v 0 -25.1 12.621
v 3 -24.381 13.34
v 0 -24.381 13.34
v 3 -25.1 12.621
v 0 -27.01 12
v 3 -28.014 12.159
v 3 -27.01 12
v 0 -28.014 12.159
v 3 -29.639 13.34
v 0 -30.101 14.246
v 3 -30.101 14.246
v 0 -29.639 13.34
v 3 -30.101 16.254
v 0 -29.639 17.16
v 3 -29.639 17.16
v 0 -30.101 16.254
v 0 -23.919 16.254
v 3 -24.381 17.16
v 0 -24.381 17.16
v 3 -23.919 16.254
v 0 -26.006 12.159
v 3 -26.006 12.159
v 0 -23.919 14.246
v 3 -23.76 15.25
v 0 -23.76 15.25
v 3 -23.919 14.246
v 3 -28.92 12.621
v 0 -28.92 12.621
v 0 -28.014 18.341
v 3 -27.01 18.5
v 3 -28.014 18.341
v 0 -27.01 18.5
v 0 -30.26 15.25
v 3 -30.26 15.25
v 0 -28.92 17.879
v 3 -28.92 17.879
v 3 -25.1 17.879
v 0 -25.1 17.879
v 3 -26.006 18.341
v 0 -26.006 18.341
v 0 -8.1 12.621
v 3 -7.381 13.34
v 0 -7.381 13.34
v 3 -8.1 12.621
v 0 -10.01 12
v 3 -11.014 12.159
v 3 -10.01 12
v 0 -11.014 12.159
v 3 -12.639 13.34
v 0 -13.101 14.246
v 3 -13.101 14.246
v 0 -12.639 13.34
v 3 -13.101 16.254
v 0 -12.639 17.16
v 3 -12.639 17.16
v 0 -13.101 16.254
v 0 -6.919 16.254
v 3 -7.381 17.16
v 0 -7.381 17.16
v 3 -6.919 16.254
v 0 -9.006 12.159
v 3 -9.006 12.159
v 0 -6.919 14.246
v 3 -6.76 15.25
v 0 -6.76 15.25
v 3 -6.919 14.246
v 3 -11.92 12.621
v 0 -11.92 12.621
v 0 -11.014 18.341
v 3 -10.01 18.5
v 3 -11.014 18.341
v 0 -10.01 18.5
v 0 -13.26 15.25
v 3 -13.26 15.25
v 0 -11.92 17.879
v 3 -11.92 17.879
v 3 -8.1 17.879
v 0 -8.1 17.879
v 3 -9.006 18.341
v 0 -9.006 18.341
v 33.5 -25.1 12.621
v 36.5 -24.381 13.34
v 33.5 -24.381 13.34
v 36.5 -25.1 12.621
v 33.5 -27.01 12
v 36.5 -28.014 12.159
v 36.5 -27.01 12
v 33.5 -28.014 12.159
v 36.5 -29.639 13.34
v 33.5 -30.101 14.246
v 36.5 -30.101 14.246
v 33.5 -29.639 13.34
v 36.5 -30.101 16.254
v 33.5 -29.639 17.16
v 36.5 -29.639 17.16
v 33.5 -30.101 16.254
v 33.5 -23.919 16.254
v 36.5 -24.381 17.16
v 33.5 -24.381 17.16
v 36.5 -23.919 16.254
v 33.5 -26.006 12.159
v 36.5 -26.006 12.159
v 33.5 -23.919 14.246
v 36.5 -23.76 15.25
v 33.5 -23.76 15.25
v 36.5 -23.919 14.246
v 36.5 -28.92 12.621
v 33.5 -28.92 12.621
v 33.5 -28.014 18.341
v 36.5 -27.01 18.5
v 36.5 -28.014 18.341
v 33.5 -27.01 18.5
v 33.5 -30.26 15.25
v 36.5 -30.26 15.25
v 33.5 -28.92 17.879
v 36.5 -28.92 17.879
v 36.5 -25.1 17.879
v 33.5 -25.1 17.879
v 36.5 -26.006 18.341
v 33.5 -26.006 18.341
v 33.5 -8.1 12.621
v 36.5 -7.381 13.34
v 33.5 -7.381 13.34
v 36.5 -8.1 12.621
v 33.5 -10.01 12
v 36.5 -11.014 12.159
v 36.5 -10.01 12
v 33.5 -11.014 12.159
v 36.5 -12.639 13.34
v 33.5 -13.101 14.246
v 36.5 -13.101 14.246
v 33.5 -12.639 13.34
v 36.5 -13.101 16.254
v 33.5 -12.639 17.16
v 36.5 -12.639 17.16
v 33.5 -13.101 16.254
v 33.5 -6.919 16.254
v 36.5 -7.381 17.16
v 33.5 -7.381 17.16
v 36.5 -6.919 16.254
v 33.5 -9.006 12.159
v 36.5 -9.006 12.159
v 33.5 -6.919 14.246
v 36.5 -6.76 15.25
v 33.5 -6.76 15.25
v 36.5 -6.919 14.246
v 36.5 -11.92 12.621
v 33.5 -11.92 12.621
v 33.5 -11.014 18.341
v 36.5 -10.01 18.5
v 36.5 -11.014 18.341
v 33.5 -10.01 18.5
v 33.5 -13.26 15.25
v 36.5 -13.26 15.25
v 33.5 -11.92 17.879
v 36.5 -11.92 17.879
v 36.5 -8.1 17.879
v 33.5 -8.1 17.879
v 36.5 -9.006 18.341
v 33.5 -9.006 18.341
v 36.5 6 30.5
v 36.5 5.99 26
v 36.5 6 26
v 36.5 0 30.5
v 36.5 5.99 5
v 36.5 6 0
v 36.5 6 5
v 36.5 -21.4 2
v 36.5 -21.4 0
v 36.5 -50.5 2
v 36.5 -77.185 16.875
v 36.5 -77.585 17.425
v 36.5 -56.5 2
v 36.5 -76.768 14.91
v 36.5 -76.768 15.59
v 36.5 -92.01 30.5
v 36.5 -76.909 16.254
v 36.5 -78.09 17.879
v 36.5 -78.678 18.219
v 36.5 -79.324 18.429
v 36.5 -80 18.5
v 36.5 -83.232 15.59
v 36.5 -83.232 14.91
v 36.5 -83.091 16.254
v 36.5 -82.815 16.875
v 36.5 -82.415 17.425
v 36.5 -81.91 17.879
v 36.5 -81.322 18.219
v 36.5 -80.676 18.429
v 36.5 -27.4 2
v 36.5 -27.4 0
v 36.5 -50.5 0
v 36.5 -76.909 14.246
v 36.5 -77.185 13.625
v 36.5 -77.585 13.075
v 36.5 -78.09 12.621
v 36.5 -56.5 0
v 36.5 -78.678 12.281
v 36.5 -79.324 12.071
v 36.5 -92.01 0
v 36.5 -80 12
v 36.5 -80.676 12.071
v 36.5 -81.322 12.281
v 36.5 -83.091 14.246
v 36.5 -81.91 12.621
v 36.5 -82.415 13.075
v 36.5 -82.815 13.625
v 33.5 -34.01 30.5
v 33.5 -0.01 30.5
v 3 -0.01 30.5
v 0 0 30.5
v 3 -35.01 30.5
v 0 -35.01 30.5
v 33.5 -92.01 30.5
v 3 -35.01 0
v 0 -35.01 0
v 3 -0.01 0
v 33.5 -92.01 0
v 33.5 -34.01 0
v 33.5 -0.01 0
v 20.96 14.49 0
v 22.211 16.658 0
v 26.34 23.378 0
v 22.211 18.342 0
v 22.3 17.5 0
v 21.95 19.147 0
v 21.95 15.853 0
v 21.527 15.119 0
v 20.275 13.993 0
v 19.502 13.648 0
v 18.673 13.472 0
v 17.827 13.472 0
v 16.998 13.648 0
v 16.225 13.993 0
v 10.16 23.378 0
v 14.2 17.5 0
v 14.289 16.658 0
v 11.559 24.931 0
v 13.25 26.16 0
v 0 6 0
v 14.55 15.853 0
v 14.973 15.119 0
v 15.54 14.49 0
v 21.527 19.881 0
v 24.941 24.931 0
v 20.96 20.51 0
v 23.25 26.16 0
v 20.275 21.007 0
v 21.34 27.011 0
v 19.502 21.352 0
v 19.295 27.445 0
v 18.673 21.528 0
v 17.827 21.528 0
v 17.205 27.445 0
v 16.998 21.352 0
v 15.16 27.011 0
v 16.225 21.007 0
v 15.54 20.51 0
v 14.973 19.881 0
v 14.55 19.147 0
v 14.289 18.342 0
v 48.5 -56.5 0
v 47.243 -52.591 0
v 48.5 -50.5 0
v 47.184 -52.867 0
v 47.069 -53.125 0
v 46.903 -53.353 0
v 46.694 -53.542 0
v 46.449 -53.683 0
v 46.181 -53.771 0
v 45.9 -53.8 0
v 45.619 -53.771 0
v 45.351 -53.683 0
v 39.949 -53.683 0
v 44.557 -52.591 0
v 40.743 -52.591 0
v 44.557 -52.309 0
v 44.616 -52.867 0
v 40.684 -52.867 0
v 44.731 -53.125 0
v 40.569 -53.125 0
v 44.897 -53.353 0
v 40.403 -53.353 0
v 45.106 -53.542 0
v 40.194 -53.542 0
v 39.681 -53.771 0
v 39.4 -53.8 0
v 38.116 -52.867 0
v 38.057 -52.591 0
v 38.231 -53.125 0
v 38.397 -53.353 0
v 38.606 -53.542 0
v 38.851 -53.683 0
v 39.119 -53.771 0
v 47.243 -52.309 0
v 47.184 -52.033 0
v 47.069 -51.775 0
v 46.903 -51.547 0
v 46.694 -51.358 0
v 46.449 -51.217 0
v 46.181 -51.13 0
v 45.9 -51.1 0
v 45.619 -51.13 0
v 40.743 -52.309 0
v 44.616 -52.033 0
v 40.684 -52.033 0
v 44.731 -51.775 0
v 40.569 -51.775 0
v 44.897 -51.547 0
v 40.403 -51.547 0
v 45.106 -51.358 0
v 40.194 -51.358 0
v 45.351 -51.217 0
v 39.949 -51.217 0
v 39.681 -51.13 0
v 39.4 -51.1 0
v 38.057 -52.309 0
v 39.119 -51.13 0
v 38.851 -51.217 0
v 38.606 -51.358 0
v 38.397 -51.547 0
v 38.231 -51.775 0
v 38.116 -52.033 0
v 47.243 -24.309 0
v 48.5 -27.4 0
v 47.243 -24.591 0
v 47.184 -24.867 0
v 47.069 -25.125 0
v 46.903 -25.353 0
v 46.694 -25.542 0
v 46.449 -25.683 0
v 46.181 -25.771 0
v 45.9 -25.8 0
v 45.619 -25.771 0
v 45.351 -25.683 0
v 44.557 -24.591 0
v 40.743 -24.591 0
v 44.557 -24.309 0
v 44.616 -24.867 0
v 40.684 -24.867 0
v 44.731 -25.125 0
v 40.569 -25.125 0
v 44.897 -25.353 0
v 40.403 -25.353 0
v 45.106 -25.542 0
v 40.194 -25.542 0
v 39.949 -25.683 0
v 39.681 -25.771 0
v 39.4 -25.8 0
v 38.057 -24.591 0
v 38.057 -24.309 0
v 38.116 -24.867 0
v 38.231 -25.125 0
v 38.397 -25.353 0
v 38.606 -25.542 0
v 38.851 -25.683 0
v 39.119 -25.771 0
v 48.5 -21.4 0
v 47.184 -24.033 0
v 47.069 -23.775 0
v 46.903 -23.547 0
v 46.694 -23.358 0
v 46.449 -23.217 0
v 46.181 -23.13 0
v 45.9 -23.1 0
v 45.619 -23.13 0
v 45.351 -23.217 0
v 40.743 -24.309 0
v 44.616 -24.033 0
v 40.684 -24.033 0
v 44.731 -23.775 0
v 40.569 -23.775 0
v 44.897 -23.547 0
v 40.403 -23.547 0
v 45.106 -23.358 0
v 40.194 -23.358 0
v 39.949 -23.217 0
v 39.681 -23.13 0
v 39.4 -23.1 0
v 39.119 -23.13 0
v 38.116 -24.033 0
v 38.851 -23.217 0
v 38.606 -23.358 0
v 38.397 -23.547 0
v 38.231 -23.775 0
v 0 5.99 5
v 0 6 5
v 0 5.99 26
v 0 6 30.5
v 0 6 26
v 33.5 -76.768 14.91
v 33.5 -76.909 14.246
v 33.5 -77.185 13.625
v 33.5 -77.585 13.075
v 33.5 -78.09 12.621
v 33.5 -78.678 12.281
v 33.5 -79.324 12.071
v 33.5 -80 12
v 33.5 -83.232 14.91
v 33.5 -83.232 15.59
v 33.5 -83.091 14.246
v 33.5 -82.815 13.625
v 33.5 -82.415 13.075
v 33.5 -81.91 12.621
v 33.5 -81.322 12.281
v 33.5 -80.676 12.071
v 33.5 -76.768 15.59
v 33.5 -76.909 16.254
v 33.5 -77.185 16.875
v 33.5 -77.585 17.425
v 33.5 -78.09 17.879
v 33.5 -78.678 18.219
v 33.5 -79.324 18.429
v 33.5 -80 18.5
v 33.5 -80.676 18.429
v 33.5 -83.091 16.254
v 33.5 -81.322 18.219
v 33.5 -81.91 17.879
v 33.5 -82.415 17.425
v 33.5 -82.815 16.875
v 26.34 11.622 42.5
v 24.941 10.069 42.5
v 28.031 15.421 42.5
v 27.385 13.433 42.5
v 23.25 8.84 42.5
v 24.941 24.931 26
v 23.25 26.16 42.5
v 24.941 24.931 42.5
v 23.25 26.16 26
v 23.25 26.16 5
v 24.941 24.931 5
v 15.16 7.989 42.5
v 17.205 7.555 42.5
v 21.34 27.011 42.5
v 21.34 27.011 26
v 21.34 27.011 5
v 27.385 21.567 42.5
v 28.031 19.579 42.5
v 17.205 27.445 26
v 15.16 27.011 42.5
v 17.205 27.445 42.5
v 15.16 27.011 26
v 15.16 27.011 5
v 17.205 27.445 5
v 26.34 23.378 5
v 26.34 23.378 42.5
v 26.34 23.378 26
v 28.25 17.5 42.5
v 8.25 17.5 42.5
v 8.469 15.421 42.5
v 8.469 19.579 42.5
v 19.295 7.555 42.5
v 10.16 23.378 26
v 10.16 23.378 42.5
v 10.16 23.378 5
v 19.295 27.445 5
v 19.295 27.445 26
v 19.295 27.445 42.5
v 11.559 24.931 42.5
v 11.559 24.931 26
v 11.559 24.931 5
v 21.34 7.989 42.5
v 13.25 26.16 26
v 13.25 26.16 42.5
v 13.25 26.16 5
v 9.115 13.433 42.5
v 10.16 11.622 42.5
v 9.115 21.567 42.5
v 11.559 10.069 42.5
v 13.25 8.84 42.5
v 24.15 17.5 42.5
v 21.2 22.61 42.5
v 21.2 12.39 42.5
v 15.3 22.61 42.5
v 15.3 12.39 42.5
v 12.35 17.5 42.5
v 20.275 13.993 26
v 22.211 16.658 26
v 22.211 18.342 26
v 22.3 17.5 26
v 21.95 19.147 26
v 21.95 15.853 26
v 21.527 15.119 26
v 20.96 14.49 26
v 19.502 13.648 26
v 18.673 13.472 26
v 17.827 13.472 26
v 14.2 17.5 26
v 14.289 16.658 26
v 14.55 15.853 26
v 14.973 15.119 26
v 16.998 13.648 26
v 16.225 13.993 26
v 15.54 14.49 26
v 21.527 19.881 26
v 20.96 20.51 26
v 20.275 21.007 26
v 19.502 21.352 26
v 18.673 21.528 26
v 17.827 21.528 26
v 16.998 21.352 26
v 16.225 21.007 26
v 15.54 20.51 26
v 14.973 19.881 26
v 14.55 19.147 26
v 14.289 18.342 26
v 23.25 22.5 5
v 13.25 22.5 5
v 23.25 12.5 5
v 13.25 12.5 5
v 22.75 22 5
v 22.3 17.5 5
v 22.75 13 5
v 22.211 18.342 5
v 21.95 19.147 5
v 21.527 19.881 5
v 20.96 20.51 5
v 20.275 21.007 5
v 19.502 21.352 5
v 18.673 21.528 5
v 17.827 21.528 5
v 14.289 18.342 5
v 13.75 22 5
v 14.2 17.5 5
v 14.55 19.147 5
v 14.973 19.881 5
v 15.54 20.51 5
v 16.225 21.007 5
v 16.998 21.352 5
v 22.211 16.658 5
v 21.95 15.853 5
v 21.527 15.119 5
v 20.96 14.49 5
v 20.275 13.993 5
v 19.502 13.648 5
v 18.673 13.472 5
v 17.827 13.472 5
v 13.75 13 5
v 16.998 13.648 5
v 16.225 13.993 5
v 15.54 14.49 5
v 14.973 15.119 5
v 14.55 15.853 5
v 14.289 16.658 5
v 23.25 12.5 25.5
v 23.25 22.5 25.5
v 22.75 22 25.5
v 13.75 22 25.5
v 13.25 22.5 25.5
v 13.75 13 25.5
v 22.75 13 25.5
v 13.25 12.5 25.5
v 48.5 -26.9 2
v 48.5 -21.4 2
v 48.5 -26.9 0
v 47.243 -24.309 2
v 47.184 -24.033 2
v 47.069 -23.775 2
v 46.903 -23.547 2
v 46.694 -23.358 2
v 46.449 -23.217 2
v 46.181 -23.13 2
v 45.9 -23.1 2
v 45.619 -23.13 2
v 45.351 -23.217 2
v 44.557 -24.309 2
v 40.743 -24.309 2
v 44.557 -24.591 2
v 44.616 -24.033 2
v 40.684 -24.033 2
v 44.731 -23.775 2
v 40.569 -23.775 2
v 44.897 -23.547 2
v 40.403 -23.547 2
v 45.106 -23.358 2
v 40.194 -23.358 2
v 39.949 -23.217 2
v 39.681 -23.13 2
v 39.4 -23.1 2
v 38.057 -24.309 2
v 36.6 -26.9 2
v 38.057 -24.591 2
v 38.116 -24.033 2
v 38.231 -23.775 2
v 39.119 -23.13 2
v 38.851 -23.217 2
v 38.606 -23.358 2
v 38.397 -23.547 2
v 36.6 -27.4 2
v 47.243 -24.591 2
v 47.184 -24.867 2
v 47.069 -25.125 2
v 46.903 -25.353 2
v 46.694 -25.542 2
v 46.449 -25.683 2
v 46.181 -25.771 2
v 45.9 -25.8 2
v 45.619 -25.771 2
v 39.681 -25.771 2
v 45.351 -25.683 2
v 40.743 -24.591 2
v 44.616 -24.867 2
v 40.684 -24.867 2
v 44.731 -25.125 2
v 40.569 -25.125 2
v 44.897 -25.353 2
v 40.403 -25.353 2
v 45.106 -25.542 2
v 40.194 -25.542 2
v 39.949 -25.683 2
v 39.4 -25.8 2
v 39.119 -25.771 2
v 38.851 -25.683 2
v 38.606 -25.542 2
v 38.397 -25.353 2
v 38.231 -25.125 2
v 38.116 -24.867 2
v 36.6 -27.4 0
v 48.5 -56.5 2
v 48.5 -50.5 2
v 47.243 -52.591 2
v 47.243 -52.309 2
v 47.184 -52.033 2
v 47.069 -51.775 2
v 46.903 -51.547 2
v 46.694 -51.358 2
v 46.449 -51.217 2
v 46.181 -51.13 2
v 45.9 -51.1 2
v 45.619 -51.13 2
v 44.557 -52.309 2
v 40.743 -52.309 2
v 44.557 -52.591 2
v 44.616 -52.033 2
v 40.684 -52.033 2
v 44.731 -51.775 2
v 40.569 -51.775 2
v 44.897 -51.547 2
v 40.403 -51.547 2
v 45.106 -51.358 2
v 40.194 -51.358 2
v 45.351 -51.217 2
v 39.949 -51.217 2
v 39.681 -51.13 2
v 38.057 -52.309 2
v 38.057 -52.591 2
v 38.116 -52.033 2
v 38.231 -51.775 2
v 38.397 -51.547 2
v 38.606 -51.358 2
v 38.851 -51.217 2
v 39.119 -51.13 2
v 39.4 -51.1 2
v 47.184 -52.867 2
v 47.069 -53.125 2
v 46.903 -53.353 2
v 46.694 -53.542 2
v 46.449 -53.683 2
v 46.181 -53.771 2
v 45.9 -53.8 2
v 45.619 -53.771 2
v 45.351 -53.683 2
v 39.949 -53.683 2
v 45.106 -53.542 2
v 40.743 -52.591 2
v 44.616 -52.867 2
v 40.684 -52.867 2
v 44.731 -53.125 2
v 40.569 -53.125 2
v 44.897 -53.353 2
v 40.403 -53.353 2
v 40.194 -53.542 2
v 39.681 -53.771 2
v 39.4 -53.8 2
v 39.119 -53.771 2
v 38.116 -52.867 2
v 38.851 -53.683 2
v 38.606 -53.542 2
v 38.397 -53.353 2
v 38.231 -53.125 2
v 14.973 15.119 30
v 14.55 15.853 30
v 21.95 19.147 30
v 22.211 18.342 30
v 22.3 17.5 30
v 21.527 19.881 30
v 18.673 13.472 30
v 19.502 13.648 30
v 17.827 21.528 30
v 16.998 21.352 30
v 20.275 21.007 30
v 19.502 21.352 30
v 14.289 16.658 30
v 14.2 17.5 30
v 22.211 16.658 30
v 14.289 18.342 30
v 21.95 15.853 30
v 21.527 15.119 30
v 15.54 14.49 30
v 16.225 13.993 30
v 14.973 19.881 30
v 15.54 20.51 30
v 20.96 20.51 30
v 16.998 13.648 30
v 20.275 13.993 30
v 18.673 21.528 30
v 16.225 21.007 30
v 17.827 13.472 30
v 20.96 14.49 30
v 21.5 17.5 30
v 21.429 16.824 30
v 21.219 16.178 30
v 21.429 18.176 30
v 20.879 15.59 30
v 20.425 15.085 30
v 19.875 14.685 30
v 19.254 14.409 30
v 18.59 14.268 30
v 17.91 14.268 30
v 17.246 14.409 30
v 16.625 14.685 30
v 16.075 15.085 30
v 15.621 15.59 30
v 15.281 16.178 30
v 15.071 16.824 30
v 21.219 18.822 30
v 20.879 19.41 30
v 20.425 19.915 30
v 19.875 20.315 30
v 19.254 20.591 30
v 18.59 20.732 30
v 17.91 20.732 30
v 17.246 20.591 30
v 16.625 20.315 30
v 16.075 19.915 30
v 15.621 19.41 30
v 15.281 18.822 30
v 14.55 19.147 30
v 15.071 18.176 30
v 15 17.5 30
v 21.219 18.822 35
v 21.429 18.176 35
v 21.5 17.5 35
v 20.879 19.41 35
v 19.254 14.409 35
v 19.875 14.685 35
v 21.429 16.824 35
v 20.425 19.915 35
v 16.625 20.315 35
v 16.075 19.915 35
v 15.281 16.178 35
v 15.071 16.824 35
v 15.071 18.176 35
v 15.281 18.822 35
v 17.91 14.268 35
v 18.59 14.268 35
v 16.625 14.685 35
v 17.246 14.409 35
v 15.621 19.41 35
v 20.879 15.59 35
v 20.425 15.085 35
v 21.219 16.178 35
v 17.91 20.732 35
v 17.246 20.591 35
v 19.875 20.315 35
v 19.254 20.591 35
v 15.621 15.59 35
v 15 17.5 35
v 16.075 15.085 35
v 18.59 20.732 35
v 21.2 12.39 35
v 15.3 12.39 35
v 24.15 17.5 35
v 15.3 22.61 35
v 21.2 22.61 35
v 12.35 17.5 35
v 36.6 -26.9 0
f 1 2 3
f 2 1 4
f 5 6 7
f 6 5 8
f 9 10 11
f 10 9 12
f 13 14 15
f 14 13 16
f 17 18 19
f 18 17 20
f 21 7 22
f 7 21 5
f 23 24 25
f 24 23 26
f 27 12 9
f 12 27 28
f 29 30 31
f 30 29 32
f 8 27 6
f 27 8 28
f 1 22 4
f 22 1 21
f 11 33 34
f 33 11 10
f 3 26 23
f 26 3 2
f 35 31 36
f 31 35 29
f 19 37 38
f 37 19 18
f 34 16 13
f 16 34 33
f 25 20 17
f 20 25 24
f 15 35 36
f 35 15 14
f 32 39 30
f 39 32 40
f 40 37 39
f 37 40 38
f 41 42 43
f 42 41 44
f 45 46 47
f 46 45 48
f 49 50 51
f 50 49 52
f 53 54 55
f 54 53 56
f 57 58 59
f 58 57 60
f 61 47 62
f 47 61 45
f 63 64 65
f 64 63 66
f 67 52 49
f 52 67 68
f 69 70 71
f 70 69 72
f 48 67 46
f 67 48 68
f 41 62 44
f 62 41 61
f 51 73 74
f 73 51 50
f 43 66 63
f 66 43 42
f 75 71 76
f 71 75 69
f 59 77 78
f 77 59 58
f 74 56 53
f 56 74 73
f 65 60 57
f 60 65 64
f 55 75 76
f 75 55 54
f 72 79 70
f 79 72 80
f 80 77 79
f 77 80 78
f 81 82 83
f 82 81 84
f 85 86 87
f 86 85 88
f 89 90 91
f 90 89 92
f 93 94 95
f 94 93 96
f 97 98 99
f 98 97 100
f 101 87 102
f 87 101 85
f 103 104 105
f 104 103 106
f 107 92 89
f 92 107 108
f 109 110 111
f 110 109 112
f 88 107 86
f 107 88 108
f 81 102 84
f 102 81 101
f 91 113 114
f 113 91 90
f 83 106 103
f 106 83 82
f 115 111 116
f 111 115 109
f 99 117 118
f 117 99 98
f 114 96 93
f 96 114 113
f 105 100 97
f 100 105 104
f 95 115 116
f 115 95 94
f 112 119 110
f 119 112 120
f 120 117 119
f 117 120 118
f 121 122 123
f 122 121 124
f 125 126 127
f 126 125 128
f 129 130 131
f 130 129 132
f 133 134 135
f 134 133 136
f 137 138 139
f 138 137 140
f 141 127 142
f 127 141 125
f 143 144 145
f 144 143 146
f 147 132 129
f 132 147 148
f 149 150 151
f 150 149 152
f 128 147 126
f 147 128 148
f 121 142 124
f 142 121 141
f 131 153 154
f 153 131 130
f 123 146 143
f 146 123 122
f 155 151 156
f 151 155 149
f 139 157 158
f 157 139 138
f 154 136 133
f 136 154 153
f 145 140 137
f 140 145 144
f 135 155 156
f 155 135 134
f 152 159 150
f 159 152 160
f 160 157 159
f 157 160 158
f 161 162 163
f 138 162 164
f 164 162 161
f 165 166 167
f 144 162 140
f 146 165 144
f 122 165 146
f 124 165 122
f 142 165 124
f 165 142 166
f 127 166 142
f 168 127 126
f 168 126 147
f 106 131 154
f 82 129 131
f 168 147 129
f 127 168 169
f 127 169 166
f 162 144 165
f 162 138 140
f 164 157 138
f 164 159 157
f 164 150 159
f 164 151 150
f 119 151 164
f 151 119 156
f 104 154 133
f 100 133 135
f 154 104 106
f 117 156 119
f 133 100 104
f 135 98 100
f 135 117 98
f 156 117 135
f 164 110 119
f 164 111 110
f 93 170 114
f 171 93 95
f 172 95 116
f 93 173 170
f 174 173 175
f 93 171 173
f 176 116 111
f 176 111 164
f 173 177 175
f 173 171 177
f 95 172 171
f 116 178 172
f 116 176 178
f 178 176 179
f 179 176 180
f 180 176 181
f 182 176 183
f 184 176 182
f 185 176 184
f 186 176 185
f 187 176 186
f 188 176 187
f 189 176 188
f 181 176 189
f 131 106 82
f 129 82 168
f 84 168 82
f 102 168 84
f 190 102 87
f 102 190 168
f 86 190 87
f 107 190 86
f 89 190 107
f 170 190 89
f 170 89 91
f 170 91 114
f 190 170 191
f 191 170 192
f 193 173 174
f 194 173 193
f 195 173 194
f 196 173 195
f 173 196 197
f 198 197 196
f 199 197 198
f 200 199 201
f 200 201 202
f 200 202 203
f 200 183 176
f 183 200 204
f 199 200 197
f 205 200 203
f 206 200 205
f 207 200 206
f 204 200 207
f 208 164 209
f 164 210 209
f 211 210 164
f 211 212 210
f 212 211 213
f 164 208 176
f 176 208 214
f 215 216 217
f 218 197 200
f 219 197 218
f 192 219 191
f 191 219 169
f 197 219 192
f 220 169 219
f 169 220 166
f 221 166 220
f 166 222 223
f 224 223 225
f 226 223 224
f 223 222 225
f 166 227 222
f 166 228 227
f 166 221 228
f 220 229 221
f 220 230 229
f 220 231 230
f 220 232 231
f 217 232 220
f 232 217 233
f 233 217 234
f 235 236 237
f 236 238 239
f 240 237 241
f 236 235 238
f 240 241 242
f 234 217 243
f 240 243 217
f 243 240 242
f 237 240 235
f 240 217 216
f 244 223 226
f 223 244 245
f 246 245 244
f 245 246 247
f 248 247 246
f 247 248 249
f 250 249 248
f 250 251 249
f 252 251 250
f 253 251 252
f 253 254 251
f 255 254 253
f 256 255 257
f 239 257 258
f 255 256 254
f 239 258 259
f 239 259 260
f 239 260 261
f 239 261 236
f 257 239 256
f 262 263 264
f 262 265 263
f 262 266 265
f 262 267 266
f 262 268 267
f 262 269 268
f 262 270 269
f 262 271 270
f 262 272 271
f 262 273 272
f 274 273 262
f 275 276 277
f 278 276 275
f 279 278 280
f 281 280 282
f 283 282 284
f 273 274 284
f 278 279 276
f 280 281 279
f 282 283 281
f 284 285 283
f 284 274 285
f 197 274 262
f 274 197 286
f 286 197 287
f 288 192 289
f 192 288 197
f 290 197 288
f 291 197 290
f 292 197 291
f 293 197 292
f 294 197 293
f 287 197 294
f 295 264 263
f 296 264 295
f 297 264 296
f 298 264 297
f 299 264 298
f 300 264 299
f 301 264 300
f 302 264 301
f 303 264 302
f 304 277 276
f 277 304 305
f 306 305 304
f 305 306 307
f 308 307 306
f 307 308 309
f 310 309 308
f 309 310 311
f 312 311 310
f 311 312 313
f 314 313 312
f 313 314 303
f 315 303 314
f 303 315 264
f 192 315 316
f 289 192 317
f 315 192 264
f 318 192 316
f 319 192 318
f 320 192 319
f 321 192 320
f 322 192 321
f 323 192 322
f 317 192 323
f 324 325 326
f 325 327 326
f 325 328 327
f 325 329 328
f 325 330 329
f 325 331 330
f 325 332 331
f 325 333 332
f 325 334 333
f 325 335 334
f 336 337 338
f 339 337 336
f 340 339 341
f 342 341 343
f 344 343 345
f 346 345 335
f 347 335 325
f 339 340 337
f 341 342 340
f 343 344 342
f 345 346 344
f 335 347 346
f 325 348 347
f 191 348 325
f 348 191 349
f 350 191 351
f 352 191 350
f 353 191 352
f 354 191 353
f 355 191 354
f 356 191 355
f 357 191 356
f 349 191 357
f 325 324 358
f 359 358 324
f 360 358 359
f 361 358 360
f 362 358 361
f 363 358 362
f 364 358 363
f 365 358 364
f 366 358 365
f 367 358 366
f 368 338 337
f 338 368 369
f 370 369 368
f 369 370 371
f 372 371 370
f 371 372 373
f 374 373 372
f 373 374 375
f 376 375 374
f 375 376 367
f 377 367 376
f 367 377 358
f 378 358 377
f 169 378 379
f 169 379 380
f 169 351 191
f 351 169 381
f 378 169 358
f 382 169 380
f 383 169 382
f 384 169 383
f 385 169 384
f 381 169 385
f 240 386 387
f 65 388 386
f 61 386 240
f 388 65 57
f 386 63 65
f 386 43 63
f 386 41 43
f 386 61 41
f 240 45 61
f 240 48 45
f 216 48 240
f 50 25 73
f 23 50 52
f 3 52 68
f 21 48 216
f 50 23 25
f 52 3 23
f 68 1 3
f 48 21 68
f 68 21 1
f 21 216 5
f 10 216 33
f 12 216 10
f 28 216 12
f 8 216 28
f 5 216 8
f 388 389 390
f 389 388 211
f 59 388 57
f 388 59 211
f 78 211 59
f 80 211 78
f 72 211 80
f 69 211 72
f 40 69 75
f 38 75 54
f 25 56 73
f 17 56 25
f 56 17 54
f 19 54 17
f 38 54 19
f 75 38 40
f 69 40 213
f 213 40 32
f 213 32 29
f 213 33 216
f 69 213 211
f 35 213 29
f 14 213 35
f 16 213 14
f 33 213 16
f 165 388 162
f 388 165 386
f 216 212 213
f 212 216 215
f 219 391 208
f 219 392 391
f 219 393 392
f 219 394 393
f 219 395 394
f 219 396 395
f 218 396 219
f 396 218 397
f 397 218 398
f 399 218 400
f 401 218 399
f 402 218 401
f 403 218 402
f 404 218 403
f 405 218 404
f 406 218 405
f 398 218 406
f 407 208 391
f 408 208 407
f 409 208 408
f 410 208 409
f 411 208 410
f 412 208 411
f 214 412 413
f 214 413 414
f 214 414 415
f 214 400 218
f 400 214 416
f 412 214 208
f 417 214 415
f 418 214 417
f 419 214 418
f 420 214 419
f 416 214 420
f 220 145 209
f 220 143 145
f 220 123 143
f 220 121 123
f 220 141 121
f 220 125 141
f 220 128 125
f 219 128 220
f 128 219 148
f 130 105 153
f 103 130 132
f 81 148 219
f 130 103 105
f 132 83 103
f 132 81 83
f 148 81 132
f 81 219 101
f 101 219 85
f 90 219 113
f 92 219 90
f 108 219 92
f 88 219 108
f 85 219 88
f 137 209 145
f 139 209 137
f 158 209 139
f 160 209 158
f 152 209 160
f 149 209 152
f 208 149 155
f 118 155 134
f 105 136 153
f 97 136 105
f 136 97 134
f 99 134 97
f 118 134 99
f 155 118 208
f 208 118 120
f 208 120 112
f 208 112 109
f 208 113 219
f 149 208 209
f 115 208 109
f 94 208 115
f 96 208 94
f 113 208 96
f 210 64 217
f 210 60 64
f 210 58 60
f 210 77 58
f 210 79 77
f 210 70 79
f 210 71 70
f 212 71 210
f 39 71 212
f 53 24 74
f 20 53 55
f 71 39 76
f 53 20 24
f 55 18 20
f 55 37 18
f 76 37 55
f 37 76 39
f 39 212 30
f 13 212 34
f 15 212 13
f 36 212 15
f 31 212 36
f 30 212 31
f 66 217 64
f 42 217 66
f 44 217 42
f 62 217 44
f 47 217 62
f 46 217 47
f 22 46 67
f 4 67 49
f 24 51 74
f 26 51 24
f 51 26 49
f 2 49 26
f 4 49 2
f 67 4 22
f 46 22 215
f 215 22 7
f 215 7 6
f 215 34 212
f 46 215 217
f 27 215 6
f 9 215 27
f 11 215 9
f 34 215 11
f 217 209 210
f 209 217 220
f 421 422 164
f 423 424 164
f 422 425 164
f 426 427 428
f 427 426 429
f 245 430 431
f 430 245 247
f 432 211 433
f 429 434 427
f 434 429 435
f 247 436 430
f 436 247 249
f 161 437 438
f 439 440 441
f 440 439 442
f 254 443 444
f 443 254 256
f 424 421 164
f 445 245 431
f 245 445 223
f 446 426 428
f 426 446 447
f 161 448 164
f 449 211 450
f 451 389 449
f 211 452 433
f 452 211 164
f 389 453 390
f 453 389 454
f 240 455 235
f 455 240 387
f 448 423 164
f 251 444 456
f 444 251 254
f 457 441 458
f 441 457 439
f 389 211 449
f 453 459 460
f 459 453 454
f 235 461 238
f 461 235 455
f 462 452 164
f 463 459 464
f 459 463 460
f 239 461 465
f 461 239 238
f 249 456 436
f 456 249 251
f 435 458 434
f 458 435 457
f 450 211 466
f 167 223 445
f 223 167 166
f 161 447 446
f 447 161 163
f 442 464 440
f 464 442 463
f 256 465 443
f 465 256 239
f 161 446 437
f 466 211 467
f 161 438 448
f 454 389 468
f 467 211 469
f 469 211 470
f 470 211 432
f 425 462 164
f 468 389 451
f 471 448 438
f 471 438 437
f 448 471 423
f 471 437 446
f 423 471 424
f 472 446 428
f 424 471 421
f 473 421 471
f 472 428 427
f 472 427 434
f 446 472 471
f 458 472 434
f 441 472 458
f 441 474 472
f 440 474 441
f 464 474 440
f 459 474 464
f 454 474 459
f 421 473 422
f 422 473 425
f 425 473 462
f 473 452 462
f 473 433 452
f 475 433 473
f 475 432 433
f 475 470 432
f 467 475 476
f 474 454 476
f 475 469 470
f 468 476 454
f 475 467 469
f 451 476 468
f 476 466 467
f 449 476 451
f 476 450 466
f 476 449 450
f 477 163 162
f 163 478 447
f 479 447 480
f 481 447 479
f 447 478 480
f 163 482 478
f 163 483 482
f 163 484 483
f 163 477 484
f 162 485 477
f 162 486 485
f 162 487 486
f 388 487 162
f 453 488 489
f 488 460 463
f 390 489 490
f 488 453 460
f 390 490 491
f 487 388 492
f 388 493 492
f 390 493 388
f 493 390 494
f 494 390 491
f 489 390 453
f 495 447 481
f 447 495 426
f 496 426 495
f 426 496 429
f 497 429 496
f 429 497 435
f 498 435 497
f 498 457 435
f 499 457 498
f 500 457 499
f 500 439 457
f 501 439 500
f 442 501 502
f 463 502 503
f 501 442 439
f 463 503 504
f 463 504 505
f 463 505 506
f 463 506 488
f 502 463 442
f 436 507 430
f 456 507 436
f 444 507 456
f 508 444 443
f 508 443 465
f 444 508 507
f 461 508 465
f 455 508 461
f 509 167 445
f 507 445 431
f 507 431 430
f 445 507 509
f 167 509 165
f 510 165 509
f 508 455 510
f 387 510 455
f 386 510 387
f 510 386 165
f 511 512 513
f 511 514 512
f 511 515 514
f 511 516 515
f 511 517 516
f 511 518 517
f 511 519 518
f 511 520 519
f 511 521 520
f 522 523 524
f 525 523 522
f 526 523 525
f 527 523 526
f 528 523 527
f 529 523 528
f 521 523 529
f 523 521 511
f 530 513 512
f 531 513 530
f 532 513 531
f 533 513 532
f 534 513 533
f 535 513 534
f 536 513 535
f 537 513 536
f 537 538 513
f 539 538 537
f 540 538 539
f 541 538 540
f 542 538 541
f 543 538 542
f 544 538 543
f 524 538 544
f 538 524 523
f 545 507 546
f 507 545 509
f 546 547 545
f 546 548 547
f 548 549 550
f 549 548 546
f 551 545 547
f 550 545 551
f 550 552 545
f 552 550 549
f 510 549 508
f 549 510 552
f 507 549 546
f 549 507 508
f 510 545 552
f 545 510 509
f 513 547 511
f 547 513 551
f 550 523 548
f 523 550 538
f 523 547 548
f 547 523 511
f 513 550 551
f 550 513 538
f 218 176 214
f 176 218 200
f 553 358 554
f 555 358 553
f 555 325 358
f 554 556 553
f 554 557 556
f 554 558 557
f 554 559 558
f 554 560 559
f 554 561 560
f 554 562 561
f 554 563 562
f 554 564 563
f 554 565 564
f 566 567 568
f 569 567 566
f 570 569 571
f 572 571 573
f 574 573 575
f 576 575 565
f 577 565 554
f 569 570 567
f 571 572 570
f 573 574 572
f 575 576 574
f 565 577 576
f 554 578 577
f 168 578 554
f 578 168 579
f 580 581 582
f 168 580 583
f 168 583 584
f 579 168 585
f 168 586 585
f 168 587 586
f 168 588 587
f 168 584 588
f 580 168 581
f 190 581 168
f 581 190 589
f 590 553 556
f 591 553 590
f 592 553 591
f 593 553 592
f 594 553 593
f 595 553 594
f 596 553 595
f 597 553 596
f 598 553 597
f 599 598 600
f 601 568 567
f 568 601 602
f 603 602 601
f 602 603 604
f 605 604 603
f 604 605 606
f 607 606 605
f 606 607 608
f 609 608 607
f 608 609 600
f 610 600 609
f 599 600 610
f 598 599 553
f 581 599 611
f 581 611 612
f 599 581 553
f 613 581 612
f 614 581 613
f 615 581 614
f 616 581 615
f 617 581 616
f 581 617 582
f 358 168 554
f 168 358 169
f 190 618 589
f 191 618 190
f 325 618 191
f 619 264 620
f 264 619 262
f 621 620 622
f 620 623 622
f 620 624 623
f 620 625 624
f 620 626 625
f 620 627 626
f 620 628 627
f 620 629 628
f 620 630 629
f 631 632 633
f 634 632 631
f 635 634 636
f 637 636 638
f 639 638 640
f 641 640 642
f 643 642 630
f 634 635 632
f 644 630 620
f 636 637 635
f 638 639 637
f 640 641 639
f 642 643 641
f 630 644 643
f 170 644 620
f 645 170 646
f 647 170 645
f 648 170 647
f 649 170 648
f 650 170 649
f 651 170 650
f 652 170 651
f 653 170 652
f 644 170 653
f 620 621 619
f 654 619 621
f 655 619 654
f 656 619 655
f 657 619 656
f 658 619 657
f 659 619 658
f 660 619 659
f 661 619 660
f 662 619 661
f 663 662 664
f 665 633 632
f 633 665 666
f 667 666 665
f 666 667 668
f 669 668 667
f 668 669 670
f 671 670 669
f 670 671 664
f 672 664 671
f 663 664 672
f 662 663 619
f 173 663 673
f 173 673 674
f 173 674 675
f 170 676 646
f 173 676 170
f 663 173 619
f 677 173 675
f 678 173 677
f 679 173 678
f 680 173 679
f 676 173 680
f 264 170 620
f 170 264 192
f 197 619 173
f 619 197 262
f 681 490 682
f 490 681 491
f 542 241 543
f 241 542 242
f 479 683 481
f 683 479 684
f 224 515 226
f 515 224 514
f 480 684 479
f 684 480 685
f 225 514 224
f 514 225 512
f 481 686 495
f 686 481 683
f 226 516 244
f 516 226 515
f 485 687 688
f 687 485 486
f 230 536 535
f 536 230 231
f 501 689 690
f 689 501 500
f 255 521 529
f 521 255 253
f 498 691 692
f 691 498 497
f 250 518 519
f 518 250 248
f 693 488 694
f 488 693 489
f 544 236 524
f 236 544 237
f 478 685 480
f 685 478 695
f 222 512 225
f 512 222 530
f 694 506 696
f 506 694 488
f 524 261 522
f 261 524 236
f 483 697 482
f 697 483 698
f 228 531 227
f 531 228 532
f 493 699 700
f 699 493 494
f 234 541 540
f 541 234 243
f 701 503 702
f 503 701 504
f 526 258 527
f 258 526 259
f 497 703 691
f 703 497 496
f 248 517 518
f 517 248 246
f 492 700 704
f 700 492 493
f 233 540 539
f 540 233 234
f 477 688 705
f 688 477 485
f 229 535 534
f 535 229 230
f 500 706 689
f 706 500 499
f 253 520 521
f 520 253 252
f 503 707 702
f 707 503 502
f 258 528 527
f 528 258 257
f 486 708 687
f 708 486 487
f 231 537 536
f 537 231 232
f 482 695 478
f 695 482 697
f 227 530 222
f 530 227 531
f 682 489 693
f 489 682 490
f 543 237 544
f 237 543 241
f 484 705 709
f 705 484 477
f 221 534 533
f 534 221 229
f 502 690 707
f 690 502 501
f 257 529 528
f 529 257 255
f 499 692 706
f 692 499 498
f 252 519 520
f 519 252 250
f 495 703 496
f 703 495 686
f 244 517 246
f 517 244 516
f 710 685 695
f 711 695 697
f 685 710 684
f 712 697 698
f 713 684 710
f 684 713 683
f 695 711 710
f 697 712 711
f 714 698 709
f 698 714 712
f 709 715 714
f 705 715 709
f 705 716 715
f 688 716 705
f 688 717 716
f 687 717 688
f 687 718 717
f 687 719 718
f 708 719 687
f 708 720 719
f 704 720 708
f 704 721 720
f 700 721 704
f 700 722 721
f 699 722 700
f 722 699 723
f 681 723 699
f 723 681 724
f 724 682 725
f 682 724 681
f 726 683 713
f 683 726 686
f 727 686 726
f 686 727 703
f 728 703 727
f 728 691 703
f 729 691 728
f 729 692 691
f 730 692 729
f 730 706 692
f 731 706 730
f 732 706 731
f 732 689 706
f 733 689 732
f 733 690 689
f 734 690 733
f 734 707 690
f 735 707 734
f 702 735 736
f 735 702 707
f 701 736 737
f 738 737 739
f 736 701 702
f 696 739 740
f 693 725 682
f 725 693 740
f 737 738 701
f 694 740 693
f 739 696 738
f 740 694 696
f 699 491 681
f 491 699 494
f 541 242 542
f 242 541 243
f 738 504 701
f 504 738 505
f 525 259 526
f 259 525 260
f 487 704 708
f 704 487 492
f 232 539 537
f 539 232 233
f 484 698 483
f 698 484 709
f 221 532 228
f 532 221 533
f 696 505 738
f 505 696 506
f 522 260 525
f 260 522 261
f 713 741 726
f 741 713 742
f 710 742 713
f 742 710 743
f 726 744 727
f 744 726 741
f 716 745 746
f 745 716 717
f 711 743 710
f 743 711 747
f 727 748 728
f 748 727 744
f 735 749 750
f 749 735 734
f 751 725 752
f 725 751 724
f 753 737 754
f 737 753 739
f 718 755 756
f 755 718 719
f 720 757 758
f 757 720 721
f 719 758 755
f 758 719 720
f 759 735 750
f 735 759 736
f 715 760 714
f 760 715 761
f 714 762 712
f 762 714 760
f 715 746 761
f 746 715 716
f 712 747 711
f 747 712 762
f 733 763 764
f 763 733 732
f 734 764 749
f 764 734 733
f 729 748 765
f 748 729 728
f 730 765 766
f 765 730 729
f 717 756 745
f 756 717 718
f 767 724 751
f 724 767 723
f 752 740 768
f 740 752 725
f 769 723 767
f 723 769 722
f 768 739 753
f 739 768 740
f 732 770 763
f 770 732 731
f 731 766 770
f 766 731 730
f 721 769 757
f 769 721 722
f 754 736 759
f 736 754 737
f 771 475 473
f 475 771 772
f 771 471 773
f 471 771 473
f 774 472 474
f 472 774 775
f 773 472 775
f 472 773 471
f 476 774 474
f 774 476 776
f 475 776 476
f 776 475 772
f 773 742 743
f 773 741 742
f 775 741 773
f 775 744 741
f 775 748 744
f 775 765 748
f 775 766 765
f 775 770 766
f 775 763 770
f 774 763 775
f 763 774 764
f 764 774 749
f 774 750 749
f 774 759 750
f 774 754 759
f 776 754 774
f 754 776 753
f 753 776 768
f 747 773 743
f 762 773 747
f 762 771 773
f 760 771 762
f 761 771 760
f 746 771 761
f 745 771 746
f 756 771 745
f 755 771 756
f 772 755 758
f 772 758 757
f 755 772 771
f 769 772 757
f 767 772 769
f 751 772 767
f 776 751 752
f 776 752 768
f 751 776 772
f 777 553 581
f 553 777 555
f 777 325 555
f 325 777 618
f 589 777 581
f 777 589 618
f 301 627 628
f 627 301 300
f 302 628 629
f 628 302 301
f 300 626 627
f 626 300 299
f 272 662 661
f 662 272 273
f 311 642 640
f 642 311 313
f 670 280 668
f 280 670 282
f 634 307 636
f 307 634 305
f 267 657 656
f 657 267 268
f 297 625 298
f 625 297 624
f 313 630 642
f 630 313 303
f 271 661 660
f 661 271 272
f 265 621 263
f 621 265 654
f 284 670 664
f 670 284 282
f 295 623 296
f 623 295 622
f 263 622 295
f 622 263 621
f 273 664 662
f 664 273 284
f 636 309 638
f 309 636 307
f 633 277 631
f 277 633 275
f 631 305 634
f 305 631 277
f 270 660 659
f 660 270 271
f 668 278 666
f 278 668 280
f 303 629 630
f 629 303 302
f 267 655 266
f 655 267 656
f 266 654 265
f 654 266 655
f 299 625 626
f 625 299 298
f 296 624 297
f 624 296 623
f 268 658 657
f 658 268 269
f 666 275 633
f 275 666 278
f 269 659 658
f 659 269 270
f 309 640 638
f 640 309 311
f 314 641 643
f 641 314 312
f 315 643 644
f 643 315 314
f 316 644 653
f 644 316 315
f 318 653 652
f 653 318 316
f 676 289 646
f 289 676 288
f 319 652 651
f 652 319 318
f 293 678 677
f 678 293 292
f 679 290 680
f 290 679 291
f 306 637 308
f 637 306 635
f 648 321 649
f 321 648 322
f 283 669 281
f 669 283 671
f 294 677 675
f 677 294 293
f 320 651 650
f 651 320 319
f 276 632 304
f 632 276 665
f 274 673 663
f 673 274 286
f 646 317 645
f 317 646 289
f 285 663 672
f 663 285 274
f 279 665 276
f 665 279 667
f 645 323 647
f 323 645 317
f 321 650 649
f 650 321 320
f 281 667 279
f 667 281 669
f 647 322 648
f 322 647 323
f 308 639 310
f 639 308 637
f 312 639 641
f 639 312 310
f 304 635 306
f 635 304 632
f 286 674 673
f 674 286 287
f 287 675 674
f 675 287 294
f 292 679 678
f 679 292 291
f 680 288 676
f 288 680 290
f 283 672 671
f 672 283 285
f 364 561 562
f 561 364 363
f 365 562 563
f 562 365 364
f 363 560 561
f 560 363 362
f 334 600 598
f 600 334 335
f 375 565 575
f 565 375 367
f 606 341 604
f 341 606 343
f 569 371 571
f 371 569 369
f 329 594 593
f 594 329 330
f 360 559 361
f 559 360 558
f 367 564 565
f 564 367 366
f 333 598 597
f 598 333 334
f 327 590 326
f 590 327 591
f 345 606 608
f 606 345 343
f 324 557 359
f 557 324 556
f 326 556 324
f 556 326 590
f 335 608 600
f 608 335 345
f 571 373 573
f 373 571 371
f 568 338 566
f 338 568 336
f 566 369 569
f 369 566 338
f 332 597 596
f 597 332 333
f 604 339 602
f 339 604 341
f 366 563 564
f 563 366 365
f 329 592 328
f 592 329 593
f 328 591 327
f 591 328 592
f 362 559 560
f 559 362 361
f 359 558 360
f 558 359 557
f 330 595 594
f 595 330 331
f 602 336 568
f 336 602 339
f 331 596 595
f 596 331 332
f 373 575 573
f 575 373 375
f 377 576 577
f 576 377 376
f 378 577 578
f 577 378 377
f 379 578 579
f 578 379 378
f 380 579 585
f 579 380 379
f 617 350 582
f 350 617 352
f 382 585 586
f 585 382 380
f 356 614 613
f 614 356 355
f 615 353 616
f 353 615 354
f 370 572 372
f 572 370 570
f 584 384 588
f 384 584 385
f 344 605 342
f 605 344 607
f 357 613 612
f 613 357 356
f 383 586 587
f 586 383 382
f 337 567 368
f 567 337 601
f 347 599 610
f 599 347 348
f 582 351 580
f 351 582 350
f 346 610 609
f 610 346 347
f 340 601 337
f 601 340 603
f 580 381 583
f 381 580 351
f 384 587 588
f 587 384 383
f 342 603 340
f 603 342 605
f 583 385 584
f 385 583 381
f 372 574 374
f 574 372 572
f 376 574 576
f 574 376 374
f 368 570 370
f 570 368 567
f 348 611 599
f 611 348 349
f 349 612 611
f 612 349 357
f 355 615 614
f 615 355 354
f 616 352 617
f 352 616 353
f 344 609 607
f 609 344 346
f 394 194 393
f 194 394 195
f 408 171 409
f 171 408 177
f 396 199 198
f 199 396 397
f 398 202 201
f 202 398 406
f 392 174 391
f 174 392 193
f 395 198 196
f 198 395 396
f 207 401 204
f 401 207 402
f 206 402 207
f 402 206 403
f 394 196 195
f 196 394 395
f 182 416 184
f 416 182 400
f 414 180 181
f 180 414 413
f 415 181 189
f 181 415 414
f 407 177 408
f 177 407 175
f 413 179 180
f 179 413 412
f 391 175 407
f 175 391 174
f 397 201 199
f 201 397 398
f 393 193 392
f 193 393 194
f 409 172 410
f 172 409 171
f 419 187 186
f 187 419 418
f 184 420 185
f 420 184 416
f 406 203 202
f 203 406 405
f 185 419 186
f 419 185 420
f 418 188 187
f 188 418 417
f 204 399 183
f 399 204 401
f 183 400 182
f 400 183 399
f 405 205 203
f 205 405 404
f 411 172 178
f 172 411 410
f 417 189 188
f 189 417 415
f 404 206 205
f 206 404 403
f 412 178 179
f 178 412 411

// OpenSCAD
// file: ../lib/servos.scad
include <../../parameters.scad>


module D485HW_servo(screw_holes=false) {
	difference() {
		union() {
			cube([39.8, 19.8, 38], center=true);

			translate([0, 0, 28-38/2+1.25/2])
			cube([53.5, 19.8, 1.25], center=true);

			translate([53.5/2-16.8, 0, 38/2-1])
			cylinder(d=M5_screw_diameter, h=7.6, $fn=30);
		}

		if(screw_holes==false) {
			translate([-48.5/2, 5, 0])
			cylinder(d=M3_screw_diameter, h=30, $fn=30);

			translate([-48.5/2, -5, 0])
			cylinder(d=M3_screw_diameter, h=30, $fn=30);

			translate([48.5/2, 5, 0])
			cylinder(d=M3_screw_diameter, h=30, $fn=30);

			translate([48.5/2, -5, 0])
			cylinder(d=M3_screw_diameter, h=30, $fn=30);
		}
	}

	if(screw_holes==true) {
		translate([-48.5/2, 5, 0])
		cylinder(d=M3_screw_diameter, h=30, $fn=30);

		translate([-48.5/2, -5, 0])
		cylinder(d=M3_screw_diameter, h=30, $fn=30);

		translate([48.5/2, 5, 0])
		cylinder(d=M3_screw_diameter, h=30, $fn=30);

		translate([48.5/2, -5, 0])
		cylinder(d=M3_screw_diameter, h=30, $fn=30);
	}
}

module D5313_servo(screw_holes=false) {
	difference() {
		union() {
			cube([23.1, 12.1, 26.7], center=true);

			translate([0, 0, 26.7/2-7])
			cube([32, 12.1, 1.25], center=true);

			translate([23.1/2-5.5, 0, 26.7/2-1])
			cylinder(d=M5_screw_diameter, h=4.6, $fn=30);
		}

		if(screw_holes==false) {
			translate([-28/2, 6.5/2, 0])
			cylinder(d=M2_5_screw_diameter, h=30, $fn=30);

			translate([-28/2, -6.5/2, 0])
			cylinder(d=M2_5_screw_diameter, h=30, $fn=30);

			translate([28/2, 6.5/2, 0])
			cylinder(d=M2_5_screw_diameter, h=30, $fn=30);

			translate([28/2, -6.5/2, 0])
			cylinder(d=M2_5_screw_diameter, h=30, $fn=30);
		}
	}

	if(screw_holes==true) {
		translate([-28/2, 6.5/2, 0])
		cylinder(d=M2_5_screw_diameter, h=30, $fn=30);

		translate([-28/2, -6.5/2, 0])
		cylinder(d=M2_5_screw_diameter, h=30, $fn=30);

		translate([28/2, 6.5/2, 0])
		cylinder(d=M2_5_screw_diameter, h=30, $fn=30);

		translate([28/2, -6.5/2, 0])
		cylinder(d=M2_5_screw_diameter, h=30, $fn=30);
	}
}

D5313_servo();
// file: ../lib/ALU_profile_holder_top.scad
include <../../parameters.scad>



module ALU_profile_holder_top(deep=35) {
    wall_thickness = ALU_profile_holder_wall_thickness;
    
    module screw_holes() {
        translate([wall_thickness/2, 8, ALU_profile_width/2]) {
            rotate([0, 90, 0]) 
                cylinder(d=M6_screw_diameter, h=wall_thickness*2, center=true, $fn=20);
        }
        translate([wall_thickness/2, deep-10, ALU_profile_width/2]) {
                rotate([0, 90, 0])
                cylinder(d=M6_screw_diameter, h=wall_thickness*2, center=true, $fn=20);
            
        }
    }
    
    difference() {
        cube([ALU_profile_width+wall_thickness*2, deep+wall_thickness*2, ALU_profile_width]);
        translate([wall_thickness, -0.1, -0.1])
            cube([ALU_profile_width, deep+0.1, ALU_profile_width+0.2]);
        
        screw_holes();
        translate([ALU_profile_width+wall_thickness, 0, 0])
            screw_holes();
    }
}

ALU_profile_holder_top(35);
// file: ../888_1008.scad
include <../parameters.scad>
use <./lib/ALU_profile_holder_top.scad>

use <./lib/servos.scad>

module 888_1008() {
	difference() {
		union() {
			translate([0, -35.01, 0])
			ALU_profile_holder_top();

			difference() {
				hull() {
					cube([ALU_profile_width+ALU_profile_holder_wall_thickness*2, 6, ALU_profile_width]);

					translate([ALU_profile_width/2+ALU_profile_holder_wall_thickness, lock_axle_diameter/2+10, 0])
					cylinder(d=lock_axle_diameter+5, h=ALU_profile_width+12, $fn=30);
				}

				translate([0, 0, 5])
				cube([ALU_profile_width*2, ALU_profile_width*2, lock_depth+1]);
			}

			translate([ALU_profile_width+ALU_profile_holder_wall_thickness, -35.01-12-40-5, 0])
			cube([ALU_profile_holder_wall_thickness, 12+40+1+5, ALU_profile_width]);

			// servo holders
			translate([ALU_profile_width+ALU_profile_holder_wall_thickness*2-1, -(solenoid_joint_distance+servo_joint_offset+2.5)+23.1, 0])
			cube([10+1+2, 6, 2]);

			translate([ALU_profile_width+ALU_profile_holder_wall_thickness*2-1, -(solenoid_joint_distance+servo_joint_offset+2.5)-6, 0])
			cube([10+1+2, 6, 2]);

			translate([ALU_profile_width/2+ALU_profile_holder_wall_thickness, lock_axle_diameter/2+10, lock_depth/2+5])
			difference() {
				cube([10, 10, lock_depth+1], center=true);

				translate([0, 0, -1])
				cube([10-1, 10-1, lock_depth+3], center=true);
			}
		}

		translate([ALU_profile_width/2+ALU_profile_holder_wall_thickness, lock_axle_diameter/2+10, -1])
		union() {
			cylinder(d=8.1, h=31, $fn=30);

			translate([0, 0, 30])
			cylinder(d=M6_screw_diameter, h=ALU_profile_width*2, $fn=30);

			translate([0, 0, 36])
			cylinder(d=M6_nut_diameter, h=ALU_profile_width*2, $fn=6);
		}


		translate([ALU_profile_width+ALU_profile_holder_wall_thickness*2+12.1/2+.1, -(solenoid_joint_distance+servo_joint_offset+2)+23.1/2, 26.7/2])
		rotate([180, 0, 90])
		D5313_servo(true);

		translate([0, -80, ALU_profile_width/2])
		rotate([0, 90, 0])
		cylinder(d=M6_screw_diameter, h=60, $fn=30);
	}
}

888_1008();

/*
translate([ALU_profile_width+ALU_profile_holder_wall_thickness*2+12.1/2+.1, -23.1/2-35.1, 26.7/2])
rotate([0, 180, -90])
#D5313_servo();
*/
// file: ../../parameters.scad
maximum_printable_size = 150;

layer_thickness = 0.3;
global_clearance = 0.5;


//Screw diameter and nut for M10 [mm]
M10_screw_diameter = 10.4;
M10_head_height = 10;
M10_head_diameter = 16+0.5;
M10_nut_height = 10.5;
M10_nut_diameter = 25.5;
M10_nut_pocket = 22.3;

//Screw diameter for M8 [mm]
M8_screw_diameter = 8.6;
M8_head_height = 8;
M8_head_diameter = 13.5;
M8_nut_height = 7.5;
M8_square_nut_thin_height = 4.5;
M8_nut_diameter = 14.4 + 0.5;
M8_nut_pocket = 13 + 0.5;
M8_washer_diameter = 16;
M8_washer_thickness = 1.5;


//Screw diameter and nut for M6 [mm]
M6_screw_diameter=6.5;
M6_head_diameter = 10+0.5;
M6_head_height = 6;
M6_nut_height = 4.9;
M6_nut_diameter = 11.8;
M6_nut_pocket = 10.4;
M6_square_nut_height = 3;
M6_square_nut_diameter = 10;
M6_washer_thickness = 1.6;

//Screw diameter and nut for M5 [mm]
M5_screw_diameter=5.5;
M5_head_height = 5;
M5_head_diameter = 13+0.5;
M5_nut_height = 4.5;
M5_nut_diameter = 9.4;
M5_nut_pocket = 8.4;

//Screw diameter and nut for M4 [mm]
M4_screw_diameter=4.5;
M4_screw_head_height = 4;
M4_nut_height = 3.2;
M4_nut_diameter = 8.4;
M4_nut_pocket = 7.5;

//Screw diameter and nut for M3 [mm]
M3_screw_diameter = 3.2;
M3_nut_height = 2.7;
M3_nut_diameter = 6.6;
M3_nut_pocket = 5.6;
M3_screw_head_height = 3;

//Screw diameter and nut for M2,5 [mm]
M2_5_screw_diameter = 2.7;
M2_5_nut_height = 2.3;
M2_5_nut_diameter = 6;
M2_5_nut_pocket = 5.5;

// kulove lozisko

bearing_efsm_08_h = 33+1;
bearing_efsm_08_m = 22;
bearing_efsm_08_db = 18;
bearing_efsm_08_ag = 10.5;
bearing_efsm_08_n = M4_screw_diameter;
bearing_efsm_08_a1 = 5.5;
bearing_efsm_08_d = 8.25;
bearing_efsm_08_B = 8; // ball height

bearing_efsm_10_h = 38+1;
bearing_efsm_10_m = 26;
bearing_efsm_10_db = 21.9;
bearing_efsm_10_ag = 12+0.2;
bearing_efsm_10_n = M5_screw_diameter;
bearing_efsm_10_a1 = 6.5;
bearing_efsm_10_d = 10.25;


bearing_efsm_12_width = 40+1;
bearing_efsm_12_h = bearing_efsm_12_width;
bearing_efsm_12_boltd = 28/2; // polovina vzdalenosti mezi srouby
bearing_efsm_12_m = bearing_efsm_12_boltd*2;
bearing_efsm_12_db = 25;
bearing_efsm_12_ag = 13;
bearing_efsm_12_a1 = 7;
bearing_efsm_12_n = M5_screw_diameter;
bearing_efsm_12_d = 12.15;
bearing_efsm_12_B = 10; // ball height
bearing_efsm_space = 1;

bearing_efsm_17_width = 54+1;
bearing_efsm_17_h = bearing_efsm_17_width;
bearing_efsm_17_boltd = 38/2; // polovina vzdalenosti mezi srouby
bearing_efsm_17_m = bearing_efsm_17_boltd*2;
bearing_efsm_17_db = 35;
bearing_efsm_17_ag = 18;
bearing_efsm_17_n = M6_screw_diameter;
bearing_efsm_17_a1 = 10;
bearing_efsm_17_B = 17; // ball height

//limcove lozisko
bearing_EFOM_10_L=26; //celkova sirka zakladny
bearing_EFOM_10_d1=10.3;//diametr otvoru real=10 mm
bearing_EFOM_10_dB=22;//diametr vystupku pro ulozeni lozika
bearing_EFOM_10_H=52;//celková delka zakladny
bearing_EFOM_10_J=36;// hole pitch
bearing_EFOM_10_A1=6.5;//vyska pouzdra
bearing_EFOM_10_Ag=12;//celkova vyska
bearing_EFOM_10_N1=5;//sirka otvoru pro sroub
bearing_EFOM_10_N2=8;//delka otvoru pro sroub
bearing_EFOM_10_m=36;//roztec der pro sroub
bearing_EFOM_10_h=9;//vyska lozika


608_bearing_outer_diameter = 22.3;
608_bearing_inner_diameter = 16;
608_bearing_thickness = 7.1;


// 20 KG servo parameters

servo_20kg_axis_offset = 9.375; // jak je osa mimo stredu
servo_20kg_body_x = 42;
servo_20kg_body_y = 21;
servo_20kg_body_z = 40;
servo_20kg_thread_x = 49/2;
servo_20kg_thread_y = 10/2;
servo_20kg_body_below = 10; // jak hluboko je tělo serva pod drzaky na srouby
servo_20kg_below = 25.8; // jak hluboko je páka serva pod drzaky na srouby

servo_20kg_bolt_d = 2.5+0.3;
servo_20kg_nut_d = 5+0.3;


//strain gauge
strain_gauge_width = 12.7;
strain_gauge_length = 75.1;
strain_gauge_screw_distance = 10;

//ALU profile
ALU_profile_width = 30.5;
ALU_profile_holder_wall_thickness = 3;
ALU_profile_groove_width = 8;

//pillow block bearing
//https://www.igus.eu/product/372
//Part no. KSTM-08
KSTM08_screws_distance = 33;         //m
KSTM08_screws_holes_diameter = 4.5;  //d2
KSTM08_flange_thickness = 6;         //h3
KSTM08_case_width = 9;               //C1
KSTM08_case_length = 47;             //a
KSTM08_ball_width = 12;              //B
KSTM08_ball_hole_diameter = 7.85;    //d1


//ložiska pro malý rotor
bearing_outer_diameter = 10.2;    // Rozměr B1 v nákresu s přídavkem na toleranci otvoru
bearing_thickness = 4;        // Rozměr B2 v nákresu
//bearing_shaft_length = 19.5;    // Rozměr B3 v nákresu, Originalni hodnota 19.5
bearing_shaft_length = 20;    // Rozměr B3 v nákresu


//simple platform parameters
front_holder_width = 160;
front_holder_angle = 25;
front_holder_height = 60;
front_holder_offset = 15;

solenoid_travel = 25;
solenoid_force = 40;

solenoid_joint_distance = 23;
solenoid_joint_angle = 60;

lock_grab_axle_dia = 13;
lock_axle_diameter = 15;
lock_holding_force = 20;
lock_depth = 20;

lock_push_force = pow(cos(solenoid_joint_angle), 2)*solenoid_force;
lock_push_arm_length = tan(solenoid_joint_angle)*solenoid_joint_distance;
lock_hold_arm_length = (lock_push_force*lock_push_arm_length)/lock_holding_force;
lock_joint_arm_length = sqrt(pow(lock_push_arm_length, 2)+pow(solenoid_joint_distance, 2));

servo_joint_offset = 25;
servo_arm_length = 24;
servo_arm_hole_length = sqrt(pow(solenoid_travel, 2)+pow(servo_arm_length, 2))-servo_arm_length;
// main file
include <../../parameters.scad>

use <../888_1008.scad>

888_1008();
